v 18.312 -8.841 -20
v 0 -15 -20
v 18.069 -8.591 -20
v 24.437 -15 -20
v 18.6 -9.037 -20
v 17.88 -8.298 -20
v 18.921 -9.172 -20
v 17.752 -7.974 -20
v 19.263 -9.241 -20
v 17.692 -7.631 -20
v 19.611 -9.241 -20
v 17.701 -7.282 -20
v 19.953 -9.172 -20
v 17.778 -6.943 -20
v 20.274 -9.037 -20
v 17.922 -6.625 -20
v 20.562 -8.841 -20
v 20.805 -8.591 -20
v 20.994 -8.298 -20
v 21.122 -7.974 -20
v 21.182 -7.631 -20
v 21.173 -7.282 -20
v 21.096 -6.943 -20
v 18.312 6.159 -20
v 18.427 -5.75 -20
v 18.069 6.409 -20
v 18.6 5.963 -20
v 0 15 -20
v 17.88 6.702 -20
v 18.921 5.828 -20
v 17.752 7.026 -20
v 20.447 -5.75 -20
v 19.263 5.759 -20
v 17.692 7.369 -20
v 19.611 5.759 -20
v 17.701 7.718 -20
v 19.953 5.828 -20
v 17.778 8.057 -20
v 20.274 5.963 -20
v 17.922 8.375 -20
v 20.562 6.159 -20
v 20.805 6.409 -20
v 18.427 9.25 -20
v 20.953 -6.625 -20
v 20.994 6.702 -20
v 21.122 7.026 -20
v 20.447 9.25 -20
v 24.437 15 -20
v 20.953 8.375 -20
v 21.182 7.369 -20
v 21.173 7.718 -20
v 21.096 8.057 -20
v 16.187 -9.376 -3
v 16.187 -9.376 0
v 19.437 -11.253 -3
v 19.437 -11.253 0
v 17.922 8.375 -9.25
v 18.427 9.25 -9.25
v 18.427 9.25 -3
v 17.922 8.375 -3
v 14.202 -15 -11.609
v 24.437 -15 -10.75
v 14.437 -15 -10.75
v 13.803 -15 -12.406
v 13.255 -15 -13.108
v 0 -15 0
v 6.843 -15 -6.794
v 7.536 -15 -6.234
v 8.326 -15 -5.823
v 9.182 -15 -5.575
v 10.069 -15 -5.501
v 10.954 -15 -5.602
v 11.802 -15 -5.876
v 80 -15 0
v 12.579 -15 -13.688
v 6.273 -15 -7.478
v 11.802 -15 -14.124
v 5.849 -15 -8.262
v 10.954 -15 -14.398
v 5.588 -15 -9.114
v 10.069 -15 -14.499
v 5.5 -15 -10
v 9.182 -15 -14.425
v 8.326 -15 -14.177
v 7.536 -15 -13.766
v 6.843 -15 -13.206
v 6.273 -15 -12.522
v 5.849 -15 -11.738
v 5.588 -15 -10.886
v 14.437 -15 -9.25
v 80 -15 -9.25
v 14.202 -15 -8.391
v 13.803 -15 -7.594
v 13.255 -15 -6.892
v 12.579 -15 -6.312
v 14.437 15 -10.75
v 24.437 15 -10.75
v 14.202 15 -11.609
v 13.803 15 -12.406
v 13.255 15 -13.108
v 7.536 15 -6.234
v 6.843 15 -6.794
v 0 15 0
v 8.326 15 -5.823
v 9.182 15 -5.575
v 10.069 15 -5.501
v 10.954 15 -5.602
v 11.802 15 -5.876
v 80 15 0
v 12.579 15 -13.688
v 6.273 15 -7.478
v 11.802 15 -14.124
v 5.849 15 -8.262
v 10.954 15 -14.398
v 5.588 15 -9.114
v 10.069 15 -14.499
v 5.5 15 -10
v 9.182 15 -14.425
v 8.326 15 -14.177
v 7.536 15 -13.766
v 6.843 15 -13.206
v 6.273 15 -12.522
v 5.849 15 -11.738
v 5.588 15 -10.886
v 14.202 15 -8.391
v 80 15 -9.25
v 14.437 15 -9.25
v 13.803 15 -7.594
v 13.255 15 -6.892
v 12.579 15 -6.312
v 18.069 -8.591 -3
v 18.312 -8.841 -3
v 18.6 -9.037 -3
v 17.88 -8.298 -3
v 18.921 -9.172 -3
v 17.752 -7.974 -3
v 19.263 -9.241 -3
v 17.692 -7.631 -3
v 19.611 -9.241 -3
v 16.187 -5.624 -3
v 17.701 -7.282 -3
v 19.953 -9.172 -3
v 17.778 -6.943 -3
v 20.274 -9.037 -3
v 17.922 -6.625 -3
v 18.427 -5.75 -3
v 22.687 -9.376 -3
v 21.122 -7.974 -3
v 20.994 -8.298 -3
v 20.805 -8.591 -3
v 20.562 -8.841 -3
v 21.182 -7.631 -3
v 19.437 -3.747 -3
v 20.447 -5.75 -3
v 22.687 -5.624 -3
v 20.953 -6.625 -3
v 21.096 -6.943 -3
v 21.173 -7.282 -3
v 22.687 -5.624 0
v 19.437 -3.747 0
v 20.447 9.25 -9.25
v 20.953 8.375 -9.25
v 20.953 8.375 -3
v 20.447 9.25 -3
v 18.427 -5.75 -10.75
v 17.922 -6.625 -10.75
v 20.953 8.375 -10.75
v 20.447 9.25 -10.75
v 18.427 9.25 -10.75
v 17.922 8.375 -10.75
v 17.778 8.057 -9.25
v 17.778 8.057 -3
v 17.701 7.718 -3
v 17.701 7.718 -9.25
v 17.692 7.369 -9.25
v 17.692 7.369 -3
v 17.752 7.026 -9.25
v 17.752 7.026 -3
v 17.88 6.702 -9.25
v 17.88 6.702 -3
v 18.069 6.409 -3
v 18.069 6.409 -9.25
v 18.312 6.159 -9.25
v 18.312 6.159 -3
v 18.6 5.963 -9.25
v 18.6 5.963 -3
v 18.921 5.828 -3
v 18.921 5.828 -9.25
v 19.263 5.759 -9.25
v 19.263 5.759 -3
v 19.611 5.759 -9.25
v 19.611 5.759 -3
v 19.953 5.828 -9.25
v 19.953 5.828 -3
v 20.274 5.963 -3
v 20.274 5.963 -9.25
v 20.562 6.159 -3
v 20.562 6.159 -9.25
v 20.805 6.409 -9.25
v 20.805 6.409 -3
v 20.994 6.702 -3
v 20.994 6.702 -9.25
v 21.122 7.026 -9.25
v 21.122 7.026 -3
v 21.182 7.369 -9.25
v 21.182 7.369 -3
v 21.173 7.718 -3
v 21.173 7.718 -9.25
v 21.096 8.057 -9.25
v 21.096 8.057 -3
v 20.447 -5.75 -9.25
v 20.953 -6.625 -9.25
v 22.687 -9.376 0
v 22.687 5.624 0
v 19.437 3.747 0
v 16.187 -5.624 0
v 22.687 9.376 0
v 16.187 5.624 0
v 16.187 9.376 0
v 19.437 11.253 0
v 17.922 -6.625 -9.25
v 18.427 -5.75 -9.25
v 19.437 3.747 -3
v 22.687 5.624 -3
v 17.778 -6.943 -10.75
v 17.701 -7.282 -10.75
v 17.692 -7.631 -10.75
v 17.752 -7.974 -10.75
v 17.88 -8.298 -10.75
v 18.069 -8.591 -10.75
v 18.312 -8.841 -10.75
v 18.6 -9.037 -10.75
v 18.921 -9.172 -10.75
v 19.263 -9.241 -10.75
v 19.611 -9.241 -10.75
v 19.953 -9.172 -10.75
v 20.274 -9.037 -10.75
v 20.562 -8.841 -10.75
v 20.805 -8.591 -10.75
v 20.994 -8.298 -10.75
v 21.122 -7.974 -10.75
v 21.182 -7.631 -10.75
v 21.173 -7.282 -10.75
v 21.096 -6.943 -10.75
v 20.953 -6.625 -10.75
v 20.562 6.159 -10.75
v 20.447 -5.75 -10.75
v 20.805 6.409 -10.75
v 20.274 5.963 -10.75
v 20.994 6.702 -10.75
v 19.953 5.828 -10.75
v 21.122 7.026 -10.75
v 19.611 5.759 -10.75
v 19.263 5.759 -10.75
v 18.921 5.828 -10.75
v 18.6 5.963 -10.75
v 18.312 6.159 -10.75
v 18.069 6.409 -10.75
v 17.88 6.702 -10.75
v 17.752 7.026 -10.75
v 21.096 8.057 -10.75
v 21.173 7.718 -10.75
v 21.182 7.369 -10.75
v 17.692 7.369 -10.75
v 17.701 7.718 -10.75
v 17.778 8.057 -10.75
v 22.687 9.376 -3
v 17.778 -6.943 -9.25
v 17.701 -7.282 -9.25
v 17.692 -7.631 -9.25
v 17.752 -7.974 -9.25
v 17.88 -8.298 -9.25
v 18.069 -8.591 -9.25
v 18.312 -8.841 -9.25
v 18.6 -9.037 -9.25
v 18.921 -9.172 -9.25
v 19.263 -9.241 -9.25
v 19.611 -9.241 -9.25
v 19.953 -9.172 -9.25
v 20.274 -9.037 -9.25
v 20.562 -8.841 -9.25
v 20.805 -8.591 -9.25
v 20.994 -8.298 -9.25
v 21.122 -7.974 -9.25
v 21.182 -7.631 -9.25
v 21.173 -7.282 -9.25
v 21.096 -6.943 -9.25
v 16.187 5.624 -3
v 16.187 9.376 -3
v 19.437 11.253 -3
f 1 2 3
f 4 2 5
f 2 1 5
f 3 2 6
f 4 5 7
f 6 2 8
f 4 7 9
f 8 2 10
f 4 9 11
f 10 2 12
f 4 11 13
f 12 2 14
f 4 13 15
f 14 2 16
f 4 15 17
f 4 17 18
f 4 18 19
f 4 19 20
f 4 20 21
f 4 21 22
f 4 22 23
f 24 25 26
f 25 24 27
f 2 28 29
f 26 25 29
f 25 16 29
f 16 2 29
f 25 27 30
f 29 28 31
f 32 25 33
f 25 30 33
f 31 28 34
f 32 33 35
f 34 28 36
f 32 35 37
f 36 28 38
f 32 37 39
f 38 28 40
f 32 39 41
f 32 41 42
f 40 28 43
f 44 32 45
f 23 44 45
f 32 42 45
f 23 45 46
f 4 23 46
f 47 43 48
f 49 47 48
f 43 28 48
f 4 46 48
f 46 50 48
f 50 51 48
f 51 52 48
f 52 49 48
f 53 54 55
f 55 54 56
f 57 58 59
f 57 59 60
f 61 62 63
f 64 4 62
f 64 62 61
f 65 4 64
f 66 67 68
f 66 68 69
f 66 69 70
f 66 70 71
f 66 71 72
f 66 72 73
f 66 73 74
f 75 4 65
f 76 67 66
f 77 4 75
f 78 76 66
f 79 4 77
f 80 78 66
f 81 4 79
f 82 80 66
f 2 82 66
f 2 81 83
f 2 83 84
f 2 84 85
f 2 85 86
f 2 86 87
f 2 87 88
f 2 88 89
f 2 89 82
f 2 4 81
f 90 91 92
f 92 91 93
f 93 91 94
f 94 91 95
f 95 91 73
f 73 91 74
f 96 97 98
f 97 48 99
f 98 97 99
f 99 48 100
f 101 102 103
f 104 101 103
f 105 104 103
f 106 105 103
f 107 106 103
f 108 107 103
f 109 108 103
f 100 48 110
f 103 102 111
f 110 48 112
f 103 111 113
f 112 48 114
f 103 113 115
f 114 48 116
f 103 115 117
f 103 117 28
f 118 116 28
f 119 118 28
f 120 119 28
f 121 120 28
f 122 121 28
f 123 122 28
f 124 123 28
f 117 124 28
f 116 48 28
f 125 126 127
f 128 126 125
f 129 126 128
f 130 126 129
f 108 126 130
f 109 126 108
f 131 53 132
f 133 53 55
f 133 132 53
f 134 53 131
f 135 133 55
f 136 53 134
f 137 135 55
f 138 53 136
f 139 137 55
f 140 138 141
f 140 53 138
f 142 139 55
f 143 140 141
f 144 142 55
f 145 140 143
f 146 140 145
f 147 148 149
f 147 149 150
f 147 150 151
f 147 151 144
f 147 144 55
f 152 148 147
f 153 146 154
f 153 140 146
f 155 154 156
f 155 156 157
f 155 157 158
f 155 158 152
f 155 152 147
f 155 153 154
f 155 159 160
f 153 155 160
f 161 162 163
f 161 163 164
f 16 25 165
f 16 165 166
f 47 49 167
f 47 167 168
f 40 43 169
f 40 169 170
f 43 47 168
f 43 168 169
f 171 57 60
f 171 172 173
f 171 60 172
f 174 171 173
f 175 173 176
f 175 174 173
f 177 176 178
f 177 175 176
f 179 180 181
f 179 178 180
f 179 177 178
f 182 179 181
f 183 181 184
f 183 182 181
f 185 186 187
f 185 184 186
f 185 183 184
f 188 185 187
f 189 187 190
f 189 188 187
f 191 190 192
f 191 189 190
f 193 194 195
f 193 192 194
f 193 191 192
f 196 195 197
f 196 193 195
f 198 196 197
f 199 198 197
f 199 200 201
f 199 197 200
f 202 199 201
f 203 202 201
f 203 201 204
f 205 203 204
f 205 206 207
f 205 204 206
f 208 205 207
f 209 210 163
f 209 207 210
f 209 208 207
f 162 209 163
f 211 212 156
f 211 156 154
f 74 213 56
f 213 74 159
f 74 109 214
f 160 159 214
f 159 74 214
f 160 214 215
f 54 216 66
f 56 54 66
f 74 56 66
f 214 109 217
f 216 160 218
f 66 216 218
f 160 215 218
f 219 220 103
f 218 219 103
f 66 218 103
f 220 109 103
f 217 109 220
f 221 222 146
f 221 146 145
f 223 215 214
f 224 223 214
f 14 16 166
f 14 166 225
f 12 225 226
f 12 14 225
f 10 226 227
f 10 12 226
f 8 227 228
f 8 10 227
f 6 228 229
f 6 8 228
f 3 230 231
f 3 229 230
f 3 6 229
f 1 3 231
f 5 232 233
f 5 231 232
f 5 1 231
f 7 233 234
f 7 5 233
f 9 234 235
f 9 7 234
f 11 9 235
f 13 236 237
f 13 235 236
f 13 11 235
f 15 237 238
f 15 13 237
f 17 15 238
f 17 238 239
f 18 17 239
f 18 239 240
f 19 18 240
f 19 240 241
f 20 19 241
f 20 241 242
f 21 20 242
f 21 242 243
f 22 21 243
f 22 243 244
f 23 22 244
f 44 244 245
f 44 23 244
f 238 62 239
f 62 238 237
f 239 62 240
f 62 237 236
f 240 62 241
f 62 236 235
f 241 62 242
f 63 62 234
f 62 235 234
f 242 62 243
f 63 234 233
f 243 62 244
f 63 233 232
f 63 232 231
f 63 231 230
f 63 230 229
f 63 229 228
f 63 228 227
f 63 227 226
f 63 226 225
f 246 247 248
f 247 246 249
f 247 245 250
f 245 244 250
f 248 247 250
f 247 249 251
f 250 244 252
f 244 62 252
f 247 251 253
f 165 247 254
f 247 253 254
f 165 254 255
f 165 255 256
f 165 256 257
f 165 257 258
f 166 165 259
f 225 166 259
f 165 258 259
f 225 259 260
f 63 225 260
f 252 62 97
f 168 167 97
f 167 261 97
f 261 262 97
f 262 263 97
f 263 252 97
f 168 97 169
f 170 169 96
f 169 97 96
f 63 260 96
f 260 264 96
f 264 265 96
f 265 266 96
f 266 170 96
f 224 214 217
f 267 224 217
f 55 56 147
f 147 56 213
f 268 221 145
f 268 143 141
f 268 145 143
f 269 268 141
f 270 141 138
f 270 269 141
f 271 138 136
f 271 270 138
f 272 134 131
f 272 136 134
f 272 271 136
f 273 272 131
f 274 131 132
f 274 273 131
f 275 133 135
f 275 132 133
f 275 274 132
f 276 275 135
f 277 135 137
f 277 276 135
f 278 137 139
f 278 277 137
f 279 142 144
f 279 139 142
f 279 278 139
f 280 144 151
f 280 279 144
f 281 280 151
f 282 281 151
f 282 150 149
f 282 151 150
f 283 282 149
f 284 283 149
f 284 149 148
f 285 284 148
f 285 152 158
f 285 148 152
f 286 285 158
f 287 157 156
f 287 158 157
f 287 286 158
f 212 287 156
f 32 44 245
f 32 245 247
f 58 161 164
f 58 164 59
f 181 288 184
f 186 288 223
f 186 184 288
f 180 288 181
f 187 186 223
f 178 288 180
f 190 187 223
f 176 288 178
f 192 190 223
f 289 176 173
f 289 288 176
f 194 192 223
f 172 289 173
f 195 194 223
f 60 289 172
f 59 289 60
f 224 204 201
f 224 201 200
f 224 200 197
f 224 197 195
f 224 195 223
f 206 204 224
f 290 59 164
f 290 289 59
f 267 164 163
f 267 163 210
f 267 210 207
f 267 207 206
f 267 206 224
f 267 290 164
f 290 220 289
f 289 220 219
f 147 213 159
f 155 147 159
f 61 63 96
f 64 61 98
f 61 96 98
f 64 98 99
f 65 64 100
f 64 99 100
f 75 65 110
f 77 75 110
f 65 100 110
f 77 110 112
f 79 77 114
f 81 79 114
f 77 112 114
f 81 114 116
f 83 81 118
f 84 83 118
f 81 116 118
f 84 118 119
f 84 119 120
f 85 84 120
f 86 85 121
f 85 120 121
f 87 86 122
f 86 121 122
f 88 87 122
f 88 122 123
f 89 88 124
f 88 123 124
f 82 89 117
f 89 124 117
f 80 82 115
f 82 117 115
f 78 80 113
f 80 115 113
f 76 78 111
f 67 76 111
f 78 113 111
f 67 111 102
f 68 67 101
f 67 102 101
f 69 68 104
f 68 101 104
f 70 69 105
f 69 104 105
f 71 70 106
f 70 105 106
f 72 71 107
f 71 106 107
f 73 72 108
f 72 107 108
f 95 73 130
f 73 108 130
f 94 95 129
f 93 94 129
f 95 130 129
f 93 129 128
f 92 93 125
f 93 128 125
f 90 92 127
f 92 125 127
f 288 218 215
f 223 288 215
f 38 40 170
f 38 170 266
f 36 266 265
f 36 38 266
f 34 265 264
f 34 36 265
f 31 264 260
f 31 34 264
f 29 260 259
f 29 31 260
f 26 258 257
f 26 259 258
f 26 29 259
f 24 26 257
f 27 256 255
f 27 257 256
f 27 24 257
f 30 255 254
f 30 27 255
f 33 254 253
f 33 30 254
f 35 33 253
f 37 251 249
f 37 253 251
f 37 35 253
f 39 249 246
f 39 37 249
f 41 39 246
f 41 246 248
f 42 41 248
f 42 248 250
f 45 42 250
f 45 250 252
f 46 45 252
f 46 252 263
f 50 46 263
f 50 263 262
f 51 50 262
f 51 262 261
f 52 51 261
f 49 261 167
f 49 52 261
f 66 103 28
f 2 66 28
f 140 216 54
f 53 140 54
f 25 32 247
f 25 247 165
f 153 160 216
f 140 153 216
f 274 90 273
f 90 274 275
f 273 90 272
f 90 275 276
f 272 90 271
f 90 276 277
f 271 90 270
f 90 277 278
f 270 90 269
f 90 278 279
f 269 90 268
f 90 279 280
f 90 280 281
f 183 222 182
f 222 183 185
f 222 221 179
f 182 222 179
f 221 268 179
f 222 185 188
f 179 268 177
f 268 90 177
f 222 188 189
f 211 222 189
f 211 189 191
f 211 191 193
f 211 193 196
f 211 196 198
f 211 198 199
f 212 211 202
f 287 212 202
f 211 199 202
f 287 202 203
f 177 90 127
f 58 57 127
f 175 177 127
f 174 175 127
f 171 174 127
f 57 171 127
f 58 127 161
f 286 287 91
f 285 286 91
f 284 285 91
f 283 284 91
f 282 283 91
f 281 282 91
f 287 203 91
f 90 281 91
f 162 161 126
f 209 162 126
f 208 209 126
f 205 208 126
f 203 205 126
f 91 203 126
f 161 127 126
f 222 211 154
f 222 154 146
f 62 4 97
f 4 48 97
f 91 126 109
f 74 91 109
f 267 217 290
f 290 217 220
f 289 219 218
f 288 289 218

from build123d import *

# Parameters (mm, degrees)
MAIN_BODY_DEPTH      = 15
HOLES_DEPTH          = 84.815273071
HEX_NUT_RECESS_DEPTH = 3


with BuildPart() as part:
    # Schizzo2 → Main Body (new, symmetric)
    with BuildSketch(Plane(origin=(0, 0, 0), x_dir=(1, 0, 0), z_dir=(0, 1, 0))):
        with BuildLine():
            Line((0, 0), (0, 20))
            Line((0, 20), (24.437059837, 20))
            Line((24.437059837, 20), (24.437059837, 10.75))
            Line((24.437059837, 10.75), (14.437059837, 10.75))
            ThreePointArc((14.437059837, 10.75), (5.5, 10), (14.437059837, 9.25))
            Line((14.437059837, 9.25), (80, 9.25))
            Line((80, 9.25), (80, 0))
            Line((80, 0), (0, 0))
        make_face()
    extrude(amount=MAIN_BODY_DEPTH, both=True)

    # Schizzo3 → Holes (cut, through all)
    with BuildSketch(Plane(origin=(0, 0, -20), x_dir=(-1, 0, 0), z_dir=(0, 0, -1))):
        with BuildLine():
            Line((-20.447422808, -5.75), (-18.426696866, -5.75))
            Line((-18.426696866, -5.75), (-17.921515381, -6.625))
            ThreePointArc((-17.921515381, -6.625), (-19.437059837, -9.25), (-20.952604294, -6.625))
            Line((-20.952604294, -6.625), (-20.447422808, -5.75))
        make_face()
        with BuildLine():
            Line((-20.447422808, 9.25), (-18.426696866, 9.25))
            Line((-18.426696866, 9.25), (-17.921515381, 8.375))
            ThreePointArc((-17.921515381, 8.375), (-19.437059837, 5.75), (-20.952604294, 8.375))
            Line((-20.952604294, 8.375), (-20.447422808, 9.25))
        make_face()
    extrude(amount=-HOLES_DEPTH, mode=Mode.SUBTRACT)

    # Schizzo4 → Hex nut recess (cut)
    with BuildSketch(Plane.XY):
        Polygon((19.437059837, 11.25277675), (16.187059837, 9.376388375), (16.187059837, 5.623611625), (19.437059837, 3.74722325), (22.687059837, 5.623611625), (22.687059837, 9.376388375), align=None)
        Polygon((19.437059837, -3.74722325), (16.187059837, -5.623611625), (16.187059837, -9.376388375), (19.437059837, -11.25277675), (22.687059837, -9.376388375), (22.687059837, -5.623611625), align=None)
    extrude(amount=-HEX_NUT_RECESS_DEPTH, mode=Mode.SUBTRACT)


solid = part.part
